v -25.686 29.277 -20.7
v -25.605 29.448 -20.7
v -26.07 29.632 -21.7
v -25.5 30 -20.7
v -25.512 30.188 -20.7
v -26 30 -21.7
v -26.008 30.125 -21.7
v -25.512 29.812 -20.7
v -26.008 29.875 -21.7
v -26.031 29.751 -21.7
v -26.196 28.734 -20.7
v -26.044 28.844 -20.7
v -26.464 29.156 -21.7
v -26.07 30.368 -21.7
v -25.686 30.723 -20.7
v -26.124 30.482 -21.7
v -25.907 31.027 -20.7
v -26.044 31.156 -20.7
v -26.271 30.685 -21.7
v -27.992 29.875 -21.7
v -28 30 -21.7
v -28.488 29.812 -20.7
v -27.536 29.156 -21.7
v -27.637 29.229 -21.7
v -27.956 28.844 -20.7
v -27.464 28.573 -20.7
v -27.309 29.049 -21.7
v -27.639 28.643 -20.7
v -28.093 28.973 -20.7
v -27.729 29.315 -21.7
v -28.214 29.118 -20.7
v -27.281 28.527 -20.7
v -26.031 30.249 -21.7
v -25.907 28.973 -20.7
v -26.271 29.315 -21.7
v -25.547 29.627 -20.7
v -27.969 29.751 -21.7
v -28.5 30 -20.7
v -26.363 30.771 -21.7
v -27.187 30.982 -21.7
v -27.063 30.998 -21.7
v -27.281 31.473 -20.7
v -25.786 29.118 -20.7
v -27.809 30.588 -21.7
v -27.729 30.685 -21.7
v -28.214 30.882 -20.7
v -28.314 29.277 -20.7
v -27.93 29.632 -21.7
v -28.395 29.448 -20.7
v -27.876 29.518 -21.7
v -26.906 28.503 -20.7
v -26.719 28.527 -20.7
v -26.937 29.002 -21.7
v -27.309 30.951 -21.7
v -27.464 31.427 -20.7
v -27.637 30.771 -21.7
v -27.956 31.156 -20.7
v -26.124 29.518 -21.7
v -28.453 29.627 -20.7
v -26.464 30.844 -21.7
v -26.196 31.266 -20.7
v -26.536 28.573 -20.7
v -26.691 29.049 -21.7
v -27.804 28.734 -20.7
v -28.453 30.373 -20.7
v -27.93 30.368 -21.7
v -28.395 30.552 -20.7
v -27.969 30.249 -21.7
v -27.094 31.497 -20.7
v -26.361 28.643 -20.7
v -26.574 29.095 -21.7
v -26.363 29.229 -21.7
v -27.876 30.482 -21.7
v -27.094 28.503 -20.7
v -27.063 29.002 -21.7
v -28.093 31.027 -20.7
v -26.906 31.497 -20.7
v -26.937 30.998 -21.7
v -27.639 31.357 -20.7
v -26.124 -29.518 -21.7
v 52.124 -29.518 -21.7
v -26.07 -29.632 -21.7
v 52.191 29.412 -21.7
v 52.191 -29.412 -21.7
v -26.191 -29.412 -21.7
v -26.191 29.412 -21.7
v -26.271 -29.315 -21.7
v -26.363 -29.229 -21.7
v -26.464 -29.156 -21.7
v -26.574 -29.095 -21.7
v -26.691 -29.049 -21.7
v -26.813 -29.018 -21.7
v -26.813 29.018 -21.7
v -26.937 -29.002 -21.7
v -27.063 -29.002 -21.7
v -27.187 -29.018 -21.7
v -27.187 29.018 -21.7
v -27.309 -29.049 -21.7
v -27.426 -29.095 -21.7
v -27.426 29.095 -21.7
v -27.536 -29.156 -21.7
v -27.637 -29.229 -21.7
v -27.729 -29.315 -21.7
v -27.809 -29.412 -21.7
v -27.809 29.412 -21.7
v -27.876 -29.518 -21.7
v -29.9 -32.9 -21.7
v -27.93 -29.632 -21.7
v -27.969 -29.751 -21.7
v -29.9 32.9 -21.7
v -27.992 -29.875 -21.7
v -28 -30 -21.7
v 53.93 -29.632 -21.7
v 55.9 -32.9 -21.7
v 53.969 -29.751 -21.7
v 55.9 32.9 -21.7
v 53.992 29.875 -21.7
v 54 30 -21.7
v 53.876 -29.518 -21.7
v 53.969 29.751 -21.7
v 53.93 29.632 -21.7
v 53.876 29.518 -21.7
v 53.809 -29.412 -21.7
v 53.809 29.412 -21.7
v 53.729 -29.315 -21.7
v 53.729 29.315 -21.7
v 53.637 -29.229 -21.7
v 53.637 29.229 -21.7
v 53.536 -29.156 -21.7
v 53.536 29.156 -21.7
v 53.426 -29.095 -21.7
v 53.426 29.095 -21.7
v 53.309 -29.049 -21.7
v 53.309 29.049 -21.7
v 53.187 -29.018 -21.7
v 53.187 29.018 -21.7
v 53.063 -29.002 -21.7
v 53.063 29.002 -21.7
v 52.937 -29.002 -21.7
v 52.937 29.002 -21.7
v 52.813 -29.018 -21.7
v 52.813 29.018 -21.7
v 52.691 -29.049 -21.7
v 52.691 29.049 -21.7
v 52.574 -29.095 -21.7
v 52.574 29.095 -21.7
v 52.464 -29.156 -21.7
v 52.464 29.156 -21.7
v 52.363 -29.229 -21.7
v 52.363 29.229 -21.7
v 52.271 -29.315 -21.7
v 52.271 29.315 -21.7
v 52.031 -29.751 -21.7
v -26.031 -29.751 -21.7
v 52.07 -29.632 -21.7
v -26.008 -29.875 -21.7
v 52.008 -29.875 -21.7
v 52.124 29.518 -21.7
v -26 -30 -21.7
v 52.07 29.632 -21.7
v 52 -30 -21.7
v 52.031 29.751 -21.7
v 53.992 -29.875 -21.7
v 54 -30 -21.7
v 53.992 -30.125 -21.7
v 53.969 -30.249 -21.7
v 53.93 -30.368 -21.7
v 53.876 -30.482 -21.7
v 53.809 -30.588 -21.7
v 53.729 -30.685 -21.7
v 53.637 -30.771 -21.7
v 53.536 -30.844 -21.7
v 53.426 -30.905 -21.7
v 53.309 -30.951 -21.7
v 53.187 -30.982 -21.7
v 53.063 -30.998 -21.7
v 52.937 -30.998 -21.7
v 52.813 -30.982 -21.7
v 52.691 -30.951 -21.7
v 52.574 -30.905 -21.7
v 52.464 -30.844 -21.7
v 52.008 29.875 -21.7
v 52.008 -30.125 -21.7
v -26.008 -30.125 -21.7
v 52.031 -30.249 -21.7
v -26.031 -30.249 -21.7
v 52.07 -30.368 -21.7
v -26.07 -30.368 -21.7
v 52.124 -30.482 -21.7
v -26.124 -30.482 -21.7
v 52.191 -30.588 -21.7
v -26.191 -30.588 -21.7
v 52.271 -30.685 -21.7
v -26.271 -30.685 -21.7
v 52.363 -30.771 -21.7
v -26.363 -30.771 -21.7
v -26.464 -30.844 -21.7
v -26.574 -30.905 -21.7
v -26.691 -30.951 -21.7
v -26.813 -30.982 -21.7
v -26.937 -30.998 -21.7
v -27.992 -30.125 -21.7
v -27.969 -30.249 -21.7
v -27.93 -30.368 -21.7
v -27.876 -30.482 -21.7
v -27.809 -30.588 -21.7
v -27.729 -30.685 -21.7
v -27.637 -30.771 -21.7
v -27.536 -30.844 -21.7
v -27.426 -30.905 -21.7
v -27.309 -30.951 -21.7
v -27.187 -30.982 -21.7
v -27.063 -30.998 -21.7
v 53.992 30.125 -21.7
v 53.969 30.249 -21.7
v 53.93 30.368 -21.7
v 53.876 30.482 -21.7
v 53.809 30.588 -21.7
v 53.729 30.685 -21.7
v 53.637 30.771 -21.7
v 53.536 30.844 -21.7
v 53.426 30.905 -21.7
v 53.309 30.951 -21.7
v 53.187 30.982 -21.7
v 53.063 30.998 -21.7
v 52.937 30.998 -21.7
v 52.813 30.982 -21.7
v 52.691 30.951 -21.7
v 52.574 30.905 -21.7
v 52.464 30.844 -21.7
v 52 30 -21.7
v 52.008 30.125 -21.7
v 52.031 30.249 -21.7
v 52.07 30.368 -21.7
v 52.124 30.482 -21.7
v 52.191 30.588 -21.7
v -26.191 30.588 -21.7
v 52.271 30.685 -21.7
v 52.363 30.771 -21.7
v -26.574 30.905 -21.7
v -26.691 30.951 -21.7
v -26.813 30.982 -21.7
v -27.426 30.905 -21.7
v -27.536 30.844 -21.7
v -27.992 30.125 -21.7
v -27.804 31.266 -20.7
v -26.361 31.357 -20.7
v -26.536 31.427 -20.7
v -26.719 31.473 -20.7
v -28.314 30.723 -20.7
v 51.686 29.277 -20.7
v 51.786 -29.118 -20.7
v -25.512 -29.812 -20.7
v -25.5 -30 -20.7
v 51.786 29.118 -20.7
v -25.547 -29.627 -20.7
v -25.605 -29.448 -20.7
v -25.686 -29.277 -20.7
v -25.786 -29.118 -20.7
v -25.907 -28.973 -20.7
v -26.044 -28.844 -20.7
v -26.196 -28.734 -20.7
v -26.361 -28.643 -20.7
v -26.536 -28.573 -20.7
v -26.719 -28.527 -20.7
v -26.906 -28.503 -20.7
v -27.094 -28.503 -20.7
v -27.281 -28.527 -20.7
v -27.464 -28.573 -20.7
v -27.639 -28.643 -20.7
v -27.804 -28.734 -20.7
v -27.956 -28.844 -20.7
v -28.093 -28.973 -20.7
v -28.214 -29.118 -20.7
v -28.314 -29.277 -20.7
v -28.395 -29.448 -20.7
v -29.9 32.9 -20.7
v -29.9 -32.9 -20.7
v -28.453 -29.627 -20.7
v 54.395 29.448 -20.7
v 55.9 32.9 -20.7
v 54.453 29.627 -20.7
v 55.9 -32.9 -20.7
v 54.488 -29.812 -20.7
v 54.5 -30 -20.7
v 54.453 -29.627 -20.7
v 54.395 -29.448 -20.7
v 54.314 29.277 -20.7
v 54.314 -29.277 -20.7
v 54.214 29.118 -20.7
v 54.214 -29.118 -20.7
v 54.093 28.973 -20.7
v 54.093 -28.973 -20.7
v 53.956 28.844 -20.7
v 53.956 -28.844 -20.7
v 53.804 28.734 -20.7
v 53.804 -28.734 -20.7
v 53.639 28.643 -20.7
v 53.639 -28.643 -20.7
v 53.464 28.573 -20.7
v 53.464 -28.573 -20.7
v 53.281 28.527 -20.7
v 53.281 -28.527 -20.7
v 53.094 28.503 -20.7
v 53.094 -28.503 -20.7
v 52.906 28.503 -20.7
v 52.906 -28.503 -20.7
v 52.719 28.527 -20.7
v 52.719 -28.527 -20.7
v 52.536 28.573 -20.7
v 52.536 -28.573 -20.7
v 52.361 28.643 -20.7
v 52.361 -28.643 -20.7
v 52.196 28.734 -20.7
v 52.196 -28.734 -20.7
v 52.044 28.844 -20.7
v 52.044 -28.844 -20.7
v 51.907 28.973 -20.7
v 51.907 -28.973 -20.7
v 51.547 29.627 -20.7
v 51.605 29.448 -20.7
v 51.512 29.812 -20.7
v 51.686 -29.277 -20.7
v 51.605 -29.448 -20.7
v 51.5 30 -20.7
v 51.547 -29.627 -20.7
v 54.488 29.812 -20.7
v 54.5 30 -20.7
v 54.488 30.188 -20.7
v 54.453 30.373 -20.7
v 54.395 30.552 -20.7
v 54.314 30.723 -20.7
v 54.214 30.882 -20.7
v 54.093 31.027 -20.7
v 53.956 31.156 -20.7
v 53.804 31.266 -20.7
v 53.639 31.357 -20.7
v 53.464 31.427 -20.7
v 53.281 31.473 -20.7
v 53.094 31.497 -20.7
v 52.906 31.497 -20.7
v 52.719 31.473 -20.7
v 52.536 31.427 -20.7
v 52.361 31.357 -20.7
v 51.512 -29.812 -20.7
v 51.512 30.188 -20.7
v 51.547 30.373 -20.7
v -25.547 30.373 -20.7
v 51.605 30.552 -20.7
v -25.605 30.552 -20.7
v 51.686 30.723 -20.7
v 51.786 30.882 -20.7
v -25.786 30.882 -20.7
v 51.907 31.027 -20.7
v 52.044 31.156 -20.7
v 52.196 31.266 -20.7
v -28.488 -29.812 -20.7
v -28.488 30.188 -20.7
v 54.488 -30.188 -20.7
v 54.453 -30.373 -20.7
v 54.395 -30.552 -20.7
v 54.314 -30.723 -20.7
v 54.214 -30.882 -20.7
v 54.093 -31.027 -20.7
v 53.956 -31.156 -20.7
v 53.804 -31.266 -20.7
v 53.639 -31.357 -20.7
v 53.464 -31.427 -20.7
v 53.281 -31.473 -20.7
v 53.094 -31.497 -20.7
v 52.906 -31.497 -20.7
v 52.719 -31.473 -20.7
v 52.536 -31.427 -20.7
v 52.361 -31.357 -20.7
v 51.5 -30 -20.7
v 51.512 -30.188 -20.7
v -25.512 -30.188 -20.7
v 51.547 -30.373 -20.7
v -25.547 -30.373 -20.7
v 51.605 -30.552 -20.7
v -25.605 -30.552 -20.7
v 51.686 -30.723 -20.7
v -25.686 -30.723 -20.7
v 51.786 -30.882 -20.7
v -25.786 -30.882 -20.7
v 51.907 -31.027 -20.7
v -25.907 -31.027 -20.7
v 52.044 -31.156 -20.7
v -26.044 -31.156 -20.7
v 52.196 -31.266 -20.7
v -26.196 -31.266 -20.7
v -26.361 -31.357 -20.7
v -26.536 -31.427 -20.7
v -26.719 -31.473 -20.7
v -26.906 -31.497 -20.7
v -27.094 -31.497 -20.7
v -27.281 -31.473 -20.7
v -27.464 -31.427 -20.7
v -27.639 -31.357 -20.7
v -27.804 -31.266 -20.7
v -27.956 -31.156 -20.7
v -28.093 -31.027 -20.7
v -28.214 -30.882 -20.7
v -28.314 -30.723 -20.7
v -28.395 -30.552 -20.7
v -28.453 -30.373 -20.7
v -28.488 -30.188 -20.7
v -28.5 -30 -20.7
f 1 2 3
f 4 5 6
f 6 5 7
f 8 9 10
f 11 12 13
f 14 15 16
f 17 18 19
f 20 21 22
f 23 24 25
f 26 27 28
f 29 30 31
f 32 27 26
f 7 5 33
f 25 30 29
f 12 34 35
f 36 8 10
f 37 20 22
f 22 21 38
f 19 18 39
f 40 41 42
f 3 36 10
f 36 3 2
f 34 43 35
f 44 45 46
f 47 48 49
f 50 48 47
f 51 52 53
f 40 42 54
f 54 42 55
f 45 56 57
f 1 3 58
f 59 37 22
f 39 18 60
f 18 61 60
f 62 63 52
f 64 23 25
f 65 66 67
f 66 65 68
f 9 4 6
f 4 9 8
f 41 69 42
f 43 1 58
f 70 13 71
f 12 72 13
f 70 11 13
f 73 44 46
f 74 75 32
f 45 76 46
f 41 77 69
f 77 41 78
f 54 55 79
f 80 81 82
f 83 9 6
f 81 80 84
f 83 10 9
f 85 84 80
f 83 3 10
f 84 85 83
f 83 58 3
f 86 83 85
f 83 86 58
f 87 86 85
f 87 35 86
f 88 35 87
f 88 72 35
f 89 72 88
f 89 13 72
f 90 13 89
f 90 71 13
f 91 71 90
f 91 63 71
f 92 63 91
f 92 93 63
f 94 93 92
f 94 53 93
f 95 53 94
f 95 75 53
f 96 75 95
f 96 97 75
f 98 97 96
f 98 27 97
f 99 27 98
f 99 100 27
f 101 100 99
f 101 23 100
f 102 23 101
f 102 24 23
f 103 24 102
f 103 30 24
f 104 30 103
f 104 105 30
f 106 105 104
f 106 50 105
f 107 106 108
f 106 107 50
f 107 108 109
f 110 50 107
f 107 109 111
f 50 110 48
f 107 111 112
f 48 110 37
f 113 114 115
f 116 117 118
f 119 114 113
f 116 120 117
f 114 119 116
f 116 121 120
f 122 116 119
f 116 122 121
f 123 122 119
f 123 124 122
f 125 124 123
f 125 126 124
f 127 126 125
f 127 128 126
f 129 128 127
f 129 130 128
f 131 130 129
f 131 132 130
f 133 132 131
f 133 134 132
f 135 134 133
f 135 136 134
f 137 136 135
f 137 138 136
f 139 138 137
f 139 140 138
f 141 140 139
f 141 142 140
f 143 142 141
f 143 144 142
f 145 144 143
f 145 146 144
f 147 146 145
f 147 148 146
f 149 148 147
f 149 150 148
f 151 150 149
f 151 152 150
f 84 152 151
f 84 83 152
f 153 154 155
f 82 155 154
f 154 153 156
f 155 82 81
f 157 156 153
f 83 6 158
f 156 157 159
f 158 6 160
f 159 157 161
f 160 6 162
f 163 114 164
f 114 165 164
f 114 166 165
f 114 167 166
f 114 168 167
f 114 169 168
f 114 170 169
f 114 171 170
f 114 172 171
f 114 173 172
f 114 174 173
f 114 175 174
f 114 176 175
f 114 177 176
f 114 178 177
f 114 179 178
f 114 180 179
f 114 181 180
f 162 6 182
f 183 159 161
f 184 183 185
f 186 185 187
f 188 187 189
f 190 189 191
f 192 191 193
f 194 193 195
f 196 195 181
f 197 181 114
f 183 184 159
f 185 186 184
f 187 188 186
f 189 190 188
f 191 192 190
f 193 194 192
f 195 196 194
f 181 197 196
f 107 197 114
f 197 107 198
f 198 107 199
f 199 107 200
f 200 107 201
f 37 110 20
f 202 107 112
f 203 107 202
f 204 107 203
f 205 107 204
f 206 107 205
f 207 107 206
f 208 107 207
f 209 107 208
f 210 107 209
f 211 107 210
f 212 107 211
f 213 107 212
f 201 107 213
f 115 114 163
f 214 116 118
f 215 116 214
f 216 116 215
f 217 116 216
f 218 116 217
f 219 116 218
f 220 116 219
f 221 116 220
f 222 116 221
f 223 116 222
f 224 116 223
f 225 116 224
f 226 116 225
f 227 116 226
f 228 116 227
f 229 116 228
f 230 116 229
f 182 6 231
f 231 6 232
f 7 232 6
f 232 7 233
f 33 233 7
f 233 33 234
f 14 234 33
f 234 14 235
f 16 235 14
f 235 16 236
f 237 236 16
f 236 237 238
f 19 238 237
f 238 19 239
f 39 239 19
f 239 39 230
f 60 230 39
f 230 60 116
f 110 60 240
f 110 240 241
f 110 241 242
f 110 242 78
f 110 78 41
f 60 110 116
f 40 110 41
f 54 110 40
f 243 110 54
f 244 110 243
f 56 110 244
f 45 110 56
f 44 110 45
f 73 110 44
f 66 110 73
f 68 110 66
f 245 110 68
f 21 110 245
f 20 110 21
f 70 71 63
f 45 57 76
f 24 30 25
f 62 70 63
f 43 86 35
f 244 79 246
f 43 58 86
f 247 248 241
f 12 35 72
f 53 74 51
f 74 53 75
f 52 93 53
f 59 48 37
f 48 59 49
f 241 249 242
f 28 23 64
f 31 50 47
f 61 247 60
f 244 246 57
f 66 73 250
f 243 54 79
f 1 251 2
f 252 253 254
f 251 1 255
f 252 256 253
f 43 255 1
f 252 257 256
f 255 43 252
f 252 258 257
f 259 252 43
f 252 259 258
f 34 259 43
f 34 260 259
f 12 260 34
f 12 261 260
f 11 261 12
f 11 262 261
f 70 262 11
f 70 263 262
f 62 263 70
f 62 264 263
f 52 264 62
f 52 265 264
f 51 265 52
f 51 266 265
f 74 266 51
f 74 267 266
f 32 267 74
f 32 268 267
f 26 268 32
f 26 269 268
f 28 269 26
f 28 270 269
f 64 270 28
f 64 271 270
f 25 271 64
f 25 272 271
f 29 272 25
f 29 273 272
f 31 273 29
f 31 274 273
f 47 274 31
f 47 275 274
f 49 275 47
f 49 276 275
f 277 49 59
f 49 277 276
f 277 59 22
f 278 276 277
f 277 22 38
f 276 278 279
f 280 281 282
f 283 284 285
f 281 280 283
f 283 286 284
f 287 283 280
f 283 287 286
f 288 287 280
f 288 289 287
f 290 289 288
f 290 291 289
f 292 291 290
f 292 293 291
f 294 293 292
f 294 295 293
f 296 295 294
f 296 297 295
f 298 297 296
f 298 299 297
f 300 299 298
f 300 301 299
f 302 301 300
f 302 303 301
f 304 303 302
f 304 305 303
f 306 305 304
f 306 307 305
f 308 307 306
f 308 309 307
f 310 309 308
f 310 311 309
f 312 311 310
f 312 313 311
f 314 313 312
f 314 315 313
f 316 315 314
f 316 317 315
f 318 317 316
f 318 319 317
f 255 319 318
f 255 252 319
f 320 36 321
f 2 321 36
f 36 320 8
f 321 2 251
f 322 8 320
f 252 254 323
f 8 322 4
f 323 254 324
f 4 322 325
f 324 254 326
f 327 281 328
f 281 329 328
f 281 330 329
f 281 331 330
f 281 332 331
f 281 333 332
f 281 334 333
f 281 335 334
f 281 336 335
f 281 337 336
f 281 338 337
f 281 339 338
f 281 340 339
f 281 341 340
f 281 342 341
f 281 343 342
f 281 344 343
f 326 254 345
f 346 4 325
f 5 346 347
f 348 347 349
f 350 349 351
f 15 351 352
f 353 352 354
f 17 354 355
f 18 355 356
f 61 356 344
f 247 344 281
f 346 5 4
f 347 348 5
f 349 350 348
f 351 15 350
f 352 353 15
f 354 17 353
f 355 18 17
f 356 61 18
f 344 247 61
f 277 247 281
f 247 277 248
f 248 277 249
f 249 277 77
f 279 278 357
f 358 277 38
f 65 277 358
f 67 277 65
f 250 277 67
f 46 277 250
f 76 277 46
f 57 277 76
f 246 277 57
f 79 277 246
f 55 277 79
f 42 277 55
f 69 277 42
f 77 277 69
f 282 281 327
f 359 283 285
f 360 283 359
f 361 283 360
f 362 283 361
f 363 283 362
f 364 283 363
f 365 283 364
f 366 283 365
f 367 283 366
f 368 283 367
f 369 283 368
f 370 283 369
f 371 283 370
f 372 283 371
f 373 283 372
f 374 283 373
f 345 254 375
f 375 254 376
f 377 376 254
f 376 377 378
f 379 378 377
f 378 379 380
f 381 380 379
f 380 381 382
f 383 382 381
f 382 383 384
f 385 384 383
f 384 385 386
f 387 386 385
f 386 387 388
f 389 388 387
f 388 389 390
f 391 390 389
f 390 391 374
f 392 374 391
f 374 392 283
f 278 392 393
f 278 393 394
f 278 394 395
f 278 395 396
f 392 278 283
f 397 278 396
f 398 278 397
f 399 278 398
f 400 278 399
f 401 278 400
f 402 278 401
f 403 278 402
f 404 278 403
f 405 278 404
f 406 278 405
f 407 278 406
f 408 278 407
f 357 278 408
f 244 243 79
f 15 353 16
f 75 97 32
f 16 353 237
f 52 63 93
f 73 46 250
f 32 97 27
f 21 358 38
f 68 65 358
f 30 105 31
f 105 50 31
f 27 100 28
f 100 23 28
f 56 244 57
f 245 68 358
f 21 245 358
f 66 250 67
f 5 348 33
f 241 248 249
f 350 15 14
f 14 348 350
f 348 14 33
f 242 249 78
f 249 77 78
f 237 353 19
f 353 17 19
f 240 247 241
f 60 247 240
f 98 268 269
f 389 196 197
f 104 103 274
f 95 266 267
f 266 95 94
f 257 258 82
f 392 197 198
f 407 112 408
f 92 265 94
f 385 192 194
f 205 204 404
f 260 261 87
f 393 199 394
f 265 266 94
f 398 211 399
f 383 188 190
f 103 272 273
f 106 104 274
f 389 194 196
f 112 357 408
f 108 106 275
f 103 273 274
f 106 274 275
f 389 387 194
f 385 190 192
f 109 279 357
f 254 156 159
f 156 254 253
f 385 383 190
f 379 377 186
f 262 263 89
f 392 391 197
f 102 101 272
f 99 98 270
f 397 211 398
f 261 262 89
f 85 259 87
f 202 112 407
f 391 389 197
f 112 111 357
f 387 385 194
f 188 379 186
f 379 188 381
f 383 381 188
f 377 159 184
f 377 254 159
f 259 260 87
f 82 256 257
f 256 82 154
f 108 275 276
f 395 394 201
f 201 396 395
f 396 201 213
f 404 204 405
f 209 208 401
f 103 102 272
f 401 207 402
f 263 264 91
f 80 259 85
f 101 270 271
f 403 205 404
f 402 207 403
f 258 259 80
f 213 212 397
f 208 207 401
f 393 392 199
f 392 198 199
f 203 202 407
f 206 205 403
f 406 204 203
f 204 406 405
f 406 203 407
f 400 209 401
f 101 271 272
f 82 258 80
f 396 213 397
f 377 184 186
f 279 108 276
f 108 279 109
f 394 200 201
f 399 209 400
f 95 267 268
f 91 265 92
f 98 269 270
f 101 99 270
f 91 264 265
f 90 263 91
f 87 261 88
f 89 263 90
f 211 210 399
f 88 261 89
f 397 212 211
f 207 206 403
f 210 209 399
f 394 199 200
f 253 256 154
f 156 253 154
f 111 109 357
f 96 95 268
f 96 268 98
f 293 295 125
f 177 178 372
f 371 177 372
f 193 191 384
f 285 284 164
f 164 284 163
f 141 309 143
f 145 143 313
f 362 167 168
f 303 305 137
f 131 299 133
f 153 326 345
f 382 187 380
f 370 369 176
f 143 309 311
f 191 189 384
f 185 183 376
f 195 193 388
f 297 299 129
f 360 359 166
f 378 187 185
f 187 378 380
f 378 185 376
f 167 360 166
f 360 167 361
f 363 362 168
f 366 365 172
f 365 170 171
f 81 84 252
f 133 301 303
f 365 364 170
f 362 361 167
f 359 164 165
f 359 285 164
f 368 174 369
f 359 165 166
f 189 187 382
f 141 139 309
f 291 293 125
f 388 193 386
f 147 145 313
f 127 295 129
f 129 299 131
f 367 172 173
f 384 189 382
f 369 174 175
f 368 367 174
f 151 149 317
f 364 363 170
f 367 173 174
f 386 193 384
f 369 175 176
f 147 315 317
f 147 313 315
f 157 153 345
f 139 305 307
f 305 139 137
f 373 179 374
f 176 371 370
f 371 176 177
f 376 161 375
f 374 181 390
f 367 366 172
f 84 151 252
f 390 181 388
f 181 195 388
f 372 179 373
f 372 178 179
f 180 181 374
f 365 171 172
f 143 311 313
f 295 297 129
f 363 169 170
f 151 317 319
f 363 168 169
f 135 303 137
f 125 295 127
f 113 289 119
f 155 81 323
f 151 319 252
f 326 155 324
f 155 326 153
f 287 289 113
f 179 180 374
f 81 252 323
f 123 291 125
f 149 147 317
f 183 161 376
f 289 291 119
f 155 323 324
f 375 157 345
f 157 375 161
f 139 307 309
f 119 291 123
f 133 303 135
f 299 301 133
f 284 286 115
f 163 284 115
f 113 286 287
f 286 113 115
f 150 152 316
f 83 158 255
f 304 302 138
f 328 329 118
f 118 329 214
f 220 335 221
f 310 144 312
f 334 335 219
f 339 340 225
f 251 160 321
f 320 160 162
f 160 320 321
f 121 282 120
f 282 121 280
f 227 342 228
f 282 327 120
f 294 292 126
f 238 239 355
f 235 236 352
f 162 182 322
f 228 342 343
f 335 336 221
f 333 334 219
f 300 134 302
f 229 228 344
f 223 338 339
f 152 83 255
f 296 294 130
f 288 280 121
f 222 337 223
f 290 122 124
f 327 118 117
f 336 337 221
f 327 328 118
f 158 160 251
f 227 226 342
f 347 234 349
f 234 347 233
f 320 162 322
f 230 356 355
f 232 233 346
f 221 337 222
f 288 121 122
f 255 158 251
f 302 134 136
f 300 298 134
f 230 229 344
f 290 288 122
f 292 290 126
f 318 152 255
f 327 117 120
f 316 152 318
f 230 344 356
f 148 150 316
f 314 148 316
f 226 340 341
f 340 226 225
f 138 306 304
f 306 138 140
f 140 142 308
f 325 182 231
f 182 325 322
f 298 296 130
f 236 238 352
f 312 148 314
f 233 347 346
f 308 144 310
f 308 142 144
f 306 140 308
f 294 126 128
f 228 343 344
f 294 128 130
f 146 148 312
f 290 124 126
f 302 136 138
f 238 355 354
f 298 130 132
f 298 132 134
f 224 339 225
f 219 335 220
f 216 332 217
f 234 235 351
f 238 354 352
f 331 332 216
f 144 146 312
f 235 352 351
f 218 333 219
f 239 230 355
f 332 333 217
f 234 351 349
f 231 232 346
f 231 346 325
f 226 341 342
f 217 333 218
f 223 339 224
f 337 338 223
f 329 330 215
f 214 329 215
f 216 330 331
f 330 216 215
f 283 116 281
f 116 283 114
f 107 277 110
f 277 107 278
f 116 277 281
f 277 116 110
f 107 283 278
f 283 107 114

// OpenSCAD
pr = 9/2.0;
pinr = 3.3/2.0;
dial_r = 40.1 / 2.0;

w = 88;
h = 68;
d = 2;

$fn = 50;


//box_h = 13 + 1.2;
box_h = 20 + 1.1;

neji_ox = -w/2 + 4;
neji_oy = h/2 - 4;
neji_oz = -box_h +2;


module neji() {
    difference() { 
     cylinder(5, 3, 3, true);
     translate([0, 0, -2])cylinder(5, 1, 1, true);
    }
}

module neji0() {
 //translate([0, 0, 0.25])cylinder(0.5, 1, 1.5, true);
 translate([0, 0, 0])cylinder(1, 1, 1.5, true);
}

/// omote
/*
difference() {
    union(){
        difference() {
            translate([13, 0, 0])union() {
                   cube([w, h, d], true);
                   translate([neji_ox, neji_oy, neji_oz]) neji();
                   translate([neji_ox, -neji_oy, neji_oz]) neji();
                   translate([-neji_ox, -neji_oy, neji_oz]) neji();
                   translate([-neji_ox, neji_oy, neji_oz]) neji();
                }
            union(){
                cylinder(5, pr, pr, true);
                translate([-9.6, 0, 0])cylinder(5, pinr, pinr, true);
                //translate([-9.5, 0, 0])cylinder(5, pinr, pinr, true);
                //translate([0, 9.4, 0])cylinder(5, pinr, pinr, true);
                //translate([0, -9.3, 0])cylinder(5, pinr, pinr, true);
                //translate([8, 8.0, 0])cylinder(5, pinr, pinr, true);
                //translate([0, 0, 1])cylinder(0.3, dial_r, dial_r, true);
                translate([38, 0, 0])cube([11.5, 22.5, 5], true);
                translate([38, 8, -1])cube([24, 48, 2], true);
                translate([20, 0, 1]) cube([10, 0.5, 0.5], true);
            }
        }

        translate([13, 0, -box_h / 2 - 1])difference() {
           cube([w, h,  box_h], true);
           union() {
                cube([w-4, h-4, box_h], true);
                translate([0, 0, -box_h / 2 ])cube([w-2, h-2, 1], true);
            }
        }
    }

    translate([38, 20, -3])cube([12, 50, 6], true);
}
 */
 


/// Urabuta
translate([13,0, -box_h -0.1])
difference() {
    cube([w-2-0.2, h-2 -0.2, 1], true);
    union() {
        translate([neji_ox, neji_oy, 0]) neji0();
        translate([neji_ox, -neji_oy, 0]) neji0();
        translate([-neji_ox, -neji_oy, 0]) neji0();
        translate([-neji_ox, neji_oy, 0]) neji0();
    }
}


//neji0();
